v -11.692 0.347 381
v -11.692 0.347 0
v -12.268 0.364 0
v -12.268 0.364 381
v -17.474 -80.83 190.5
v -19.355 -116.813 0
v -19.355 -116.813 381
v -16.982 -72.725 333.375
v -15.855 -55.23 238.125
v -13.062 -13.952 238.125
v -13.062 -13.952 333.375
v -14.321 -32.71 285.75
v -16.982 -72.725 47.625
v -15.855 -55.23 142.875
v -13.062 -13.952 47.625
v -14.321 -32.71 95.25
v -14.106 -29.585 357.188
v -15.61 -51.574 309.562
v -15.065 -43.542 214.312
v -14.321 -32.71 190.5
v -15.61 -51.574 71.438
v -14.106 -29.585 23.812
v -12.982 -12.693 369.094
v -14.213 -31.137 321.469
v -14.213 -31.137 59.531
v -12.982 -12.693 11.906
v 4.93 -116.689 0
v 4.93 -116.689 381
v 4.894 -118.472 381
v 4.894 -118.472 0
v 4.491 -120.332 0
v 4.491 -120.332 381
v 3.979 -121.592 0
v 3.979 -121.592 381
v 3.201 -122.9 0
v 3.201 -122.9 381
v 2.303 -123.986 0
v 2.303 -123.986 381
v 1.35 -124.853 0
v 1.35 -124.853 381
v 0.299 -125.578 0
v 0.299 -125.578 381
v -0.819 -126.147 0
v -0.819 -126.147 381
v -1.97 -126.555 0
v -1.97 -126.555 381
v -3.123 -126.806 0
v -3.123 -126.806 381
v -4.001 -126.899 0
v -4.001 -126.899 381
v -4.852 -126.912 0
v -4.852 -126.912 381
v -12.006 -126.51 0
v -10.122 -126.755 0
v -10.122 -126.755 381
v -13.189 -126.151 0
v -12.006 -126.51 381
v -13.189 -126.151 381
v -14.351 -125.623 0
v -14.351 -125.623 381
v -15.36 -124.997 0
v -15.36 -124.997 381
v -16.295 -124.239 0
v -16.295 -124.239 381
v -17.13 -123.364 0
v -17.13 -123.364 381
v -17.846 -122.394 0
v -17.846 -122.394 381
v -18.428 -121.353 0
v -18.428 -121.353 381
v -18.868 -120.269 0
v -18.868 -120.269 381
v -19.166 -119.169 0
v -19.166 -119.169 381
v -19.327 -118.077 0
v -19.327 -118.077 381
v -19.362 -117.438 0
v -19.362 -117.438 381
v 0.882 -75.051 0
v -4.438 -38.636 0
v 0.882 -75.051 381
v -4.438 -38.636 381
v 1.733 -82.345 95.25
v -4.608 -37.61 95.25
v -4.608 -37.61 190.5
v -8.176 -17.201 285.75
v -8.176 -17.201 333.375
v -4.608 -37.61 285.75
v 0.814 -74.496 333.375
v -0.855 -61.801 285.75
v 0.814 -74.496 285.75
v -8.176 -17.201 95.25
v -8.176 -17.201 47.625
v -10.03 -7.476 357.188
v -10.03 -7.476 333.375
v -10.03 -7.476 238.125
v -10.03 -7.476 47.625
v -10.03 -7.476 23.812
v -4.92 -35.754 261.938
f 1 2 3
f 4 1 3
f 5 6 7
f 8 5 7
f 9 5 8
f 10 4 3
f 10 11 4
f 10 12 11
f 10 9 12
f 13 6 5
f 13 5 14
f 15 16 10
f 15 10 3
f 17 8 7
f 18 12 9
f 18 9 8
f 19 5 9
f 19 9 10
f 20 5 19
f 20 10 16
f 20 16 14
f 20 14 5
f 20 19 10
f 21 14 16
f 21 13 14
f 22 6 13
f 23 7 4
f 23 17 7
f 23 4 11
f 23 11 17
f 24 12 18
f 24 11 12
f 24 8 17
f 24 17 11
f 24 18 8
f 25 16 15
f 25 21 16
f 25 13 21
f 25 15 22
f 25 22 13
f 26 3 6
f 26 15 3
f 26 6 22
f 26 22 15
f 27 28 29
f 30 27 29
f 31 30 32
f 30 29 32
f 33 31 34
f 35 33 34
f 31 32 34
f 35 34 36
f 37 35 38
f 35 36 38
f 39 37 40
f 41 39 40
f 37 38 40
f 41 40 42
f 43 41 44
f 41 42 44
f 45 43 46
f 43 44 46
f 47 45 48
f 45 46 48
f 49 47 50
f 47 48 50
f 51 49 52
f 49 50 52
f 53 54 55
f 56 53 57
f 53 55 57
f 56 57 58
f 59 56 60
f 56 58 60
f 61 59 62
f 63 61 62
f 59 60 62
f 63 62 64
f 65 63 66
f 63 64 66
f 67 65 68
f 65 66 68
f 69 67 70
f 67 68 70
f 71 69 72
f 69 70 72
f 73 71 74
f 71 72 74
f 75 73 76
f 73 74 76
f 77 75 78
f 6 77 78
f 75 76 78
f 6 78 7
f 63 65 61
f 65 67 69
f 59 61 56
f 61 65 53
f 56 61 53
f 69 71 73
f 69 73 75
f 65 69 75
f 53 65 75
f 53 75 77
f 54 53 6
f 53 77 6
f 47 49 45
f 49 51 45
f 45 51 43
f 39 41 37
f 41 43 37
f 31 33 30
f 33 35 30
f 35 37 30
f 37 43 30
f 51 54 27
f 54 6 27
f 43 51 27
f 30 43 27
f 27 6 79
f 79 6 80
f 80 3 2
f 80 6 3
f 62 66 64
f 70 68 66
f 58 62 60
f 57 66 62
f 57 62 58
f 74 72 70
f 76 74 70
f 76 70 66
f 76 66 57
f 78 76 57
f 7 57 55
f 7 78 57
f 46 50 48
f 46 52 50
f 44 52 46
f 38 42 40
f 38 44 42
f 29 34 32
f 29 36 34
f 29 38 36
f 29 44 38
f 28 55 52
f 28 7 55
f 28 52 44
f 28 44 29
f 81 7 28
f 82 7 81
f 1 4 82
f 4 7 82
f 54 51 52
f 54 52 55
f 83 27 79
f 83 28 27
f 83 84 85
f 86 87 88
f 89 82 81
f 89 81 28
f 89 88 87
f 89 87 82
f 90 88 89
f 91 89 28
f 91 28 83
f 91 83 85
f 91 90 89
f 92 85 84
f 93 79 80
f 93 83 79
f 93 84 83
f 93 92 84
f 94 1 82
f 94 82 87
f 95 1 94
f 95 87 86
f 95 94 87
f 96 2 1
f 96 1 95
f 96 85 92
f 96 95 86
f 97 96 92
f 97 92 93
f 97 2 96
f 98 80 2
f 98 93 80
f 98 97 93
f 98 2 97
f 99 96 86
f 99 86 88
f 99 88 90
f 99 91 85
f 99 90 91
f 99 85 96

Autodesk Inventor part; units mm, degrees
ref_plane "YZ Plane" through (0, 0, 0) normal (1, 0, 0) x (0, 1, 0)
ref_plane "XZ Plane" through (0, 0, 0) normal (0, 1, 0) x (-1, 0, 0)
ref_plane "Work Plane1" through (0, 0, 0) normal (0, 0, 1) x (1, 0, 0)
sketch "Sketch1" plane through (0, 0, 0) normal (0, 0, 1) x (1, 0, 0)
  spline S0 degree 3 poles (-11.6918, 0.3474) (-9.6831, -8.2875) (-6.6853, -25.1621) (-2.182, -52.1537) (-0.1114, -65.8347) (3.0568, -94.1973) (4.2902, -107.6271) (5.2049, -120.5244) (5.4098, -123.4703) (5.6104, -127.2227) knots -42.934618 -42.934618 -42.934618 -42.934618 -30.454804 -30.454804 -15.874187 -15.874187 -5.406476 -5.406476 -3.702732 -3.702732 -3.702732 -3.702732 projected
  line L0 (-11.6918, 0.3474) -> (-12.268, 0.3645) projected
  spline S1 degree 3 poles (-19.7592, -126.469) (-19.1855, -111.8761) (-18.4212, -96.7836) (-15.3434, -44.9452) (-12.9313, -15.4603) (-12.268, 0.3645) knots -6.864026 -6.864026 -6.864026 -6.864026 -4.751617 -4.751617 0 0 0 0 projected
  line L1 (5.6104, -127.2227) -> (-19.7592, -126.469) projected
  point P0 (0, 0)
ref_plane "Work Plane2" through (-23.668, -128.0007, 381) normal (0, 0, -1) x (0, 1, 0)
extrude "Extrusion1" add sketch "Sketch1" along normal up to surface (381 mm away)
fillet "Fillet1" radius 9.525 2 edges at (5.6104, -127.2227, 190.5) (-19.7592, -126.469, 190.5)
properties part number "Vtail"
